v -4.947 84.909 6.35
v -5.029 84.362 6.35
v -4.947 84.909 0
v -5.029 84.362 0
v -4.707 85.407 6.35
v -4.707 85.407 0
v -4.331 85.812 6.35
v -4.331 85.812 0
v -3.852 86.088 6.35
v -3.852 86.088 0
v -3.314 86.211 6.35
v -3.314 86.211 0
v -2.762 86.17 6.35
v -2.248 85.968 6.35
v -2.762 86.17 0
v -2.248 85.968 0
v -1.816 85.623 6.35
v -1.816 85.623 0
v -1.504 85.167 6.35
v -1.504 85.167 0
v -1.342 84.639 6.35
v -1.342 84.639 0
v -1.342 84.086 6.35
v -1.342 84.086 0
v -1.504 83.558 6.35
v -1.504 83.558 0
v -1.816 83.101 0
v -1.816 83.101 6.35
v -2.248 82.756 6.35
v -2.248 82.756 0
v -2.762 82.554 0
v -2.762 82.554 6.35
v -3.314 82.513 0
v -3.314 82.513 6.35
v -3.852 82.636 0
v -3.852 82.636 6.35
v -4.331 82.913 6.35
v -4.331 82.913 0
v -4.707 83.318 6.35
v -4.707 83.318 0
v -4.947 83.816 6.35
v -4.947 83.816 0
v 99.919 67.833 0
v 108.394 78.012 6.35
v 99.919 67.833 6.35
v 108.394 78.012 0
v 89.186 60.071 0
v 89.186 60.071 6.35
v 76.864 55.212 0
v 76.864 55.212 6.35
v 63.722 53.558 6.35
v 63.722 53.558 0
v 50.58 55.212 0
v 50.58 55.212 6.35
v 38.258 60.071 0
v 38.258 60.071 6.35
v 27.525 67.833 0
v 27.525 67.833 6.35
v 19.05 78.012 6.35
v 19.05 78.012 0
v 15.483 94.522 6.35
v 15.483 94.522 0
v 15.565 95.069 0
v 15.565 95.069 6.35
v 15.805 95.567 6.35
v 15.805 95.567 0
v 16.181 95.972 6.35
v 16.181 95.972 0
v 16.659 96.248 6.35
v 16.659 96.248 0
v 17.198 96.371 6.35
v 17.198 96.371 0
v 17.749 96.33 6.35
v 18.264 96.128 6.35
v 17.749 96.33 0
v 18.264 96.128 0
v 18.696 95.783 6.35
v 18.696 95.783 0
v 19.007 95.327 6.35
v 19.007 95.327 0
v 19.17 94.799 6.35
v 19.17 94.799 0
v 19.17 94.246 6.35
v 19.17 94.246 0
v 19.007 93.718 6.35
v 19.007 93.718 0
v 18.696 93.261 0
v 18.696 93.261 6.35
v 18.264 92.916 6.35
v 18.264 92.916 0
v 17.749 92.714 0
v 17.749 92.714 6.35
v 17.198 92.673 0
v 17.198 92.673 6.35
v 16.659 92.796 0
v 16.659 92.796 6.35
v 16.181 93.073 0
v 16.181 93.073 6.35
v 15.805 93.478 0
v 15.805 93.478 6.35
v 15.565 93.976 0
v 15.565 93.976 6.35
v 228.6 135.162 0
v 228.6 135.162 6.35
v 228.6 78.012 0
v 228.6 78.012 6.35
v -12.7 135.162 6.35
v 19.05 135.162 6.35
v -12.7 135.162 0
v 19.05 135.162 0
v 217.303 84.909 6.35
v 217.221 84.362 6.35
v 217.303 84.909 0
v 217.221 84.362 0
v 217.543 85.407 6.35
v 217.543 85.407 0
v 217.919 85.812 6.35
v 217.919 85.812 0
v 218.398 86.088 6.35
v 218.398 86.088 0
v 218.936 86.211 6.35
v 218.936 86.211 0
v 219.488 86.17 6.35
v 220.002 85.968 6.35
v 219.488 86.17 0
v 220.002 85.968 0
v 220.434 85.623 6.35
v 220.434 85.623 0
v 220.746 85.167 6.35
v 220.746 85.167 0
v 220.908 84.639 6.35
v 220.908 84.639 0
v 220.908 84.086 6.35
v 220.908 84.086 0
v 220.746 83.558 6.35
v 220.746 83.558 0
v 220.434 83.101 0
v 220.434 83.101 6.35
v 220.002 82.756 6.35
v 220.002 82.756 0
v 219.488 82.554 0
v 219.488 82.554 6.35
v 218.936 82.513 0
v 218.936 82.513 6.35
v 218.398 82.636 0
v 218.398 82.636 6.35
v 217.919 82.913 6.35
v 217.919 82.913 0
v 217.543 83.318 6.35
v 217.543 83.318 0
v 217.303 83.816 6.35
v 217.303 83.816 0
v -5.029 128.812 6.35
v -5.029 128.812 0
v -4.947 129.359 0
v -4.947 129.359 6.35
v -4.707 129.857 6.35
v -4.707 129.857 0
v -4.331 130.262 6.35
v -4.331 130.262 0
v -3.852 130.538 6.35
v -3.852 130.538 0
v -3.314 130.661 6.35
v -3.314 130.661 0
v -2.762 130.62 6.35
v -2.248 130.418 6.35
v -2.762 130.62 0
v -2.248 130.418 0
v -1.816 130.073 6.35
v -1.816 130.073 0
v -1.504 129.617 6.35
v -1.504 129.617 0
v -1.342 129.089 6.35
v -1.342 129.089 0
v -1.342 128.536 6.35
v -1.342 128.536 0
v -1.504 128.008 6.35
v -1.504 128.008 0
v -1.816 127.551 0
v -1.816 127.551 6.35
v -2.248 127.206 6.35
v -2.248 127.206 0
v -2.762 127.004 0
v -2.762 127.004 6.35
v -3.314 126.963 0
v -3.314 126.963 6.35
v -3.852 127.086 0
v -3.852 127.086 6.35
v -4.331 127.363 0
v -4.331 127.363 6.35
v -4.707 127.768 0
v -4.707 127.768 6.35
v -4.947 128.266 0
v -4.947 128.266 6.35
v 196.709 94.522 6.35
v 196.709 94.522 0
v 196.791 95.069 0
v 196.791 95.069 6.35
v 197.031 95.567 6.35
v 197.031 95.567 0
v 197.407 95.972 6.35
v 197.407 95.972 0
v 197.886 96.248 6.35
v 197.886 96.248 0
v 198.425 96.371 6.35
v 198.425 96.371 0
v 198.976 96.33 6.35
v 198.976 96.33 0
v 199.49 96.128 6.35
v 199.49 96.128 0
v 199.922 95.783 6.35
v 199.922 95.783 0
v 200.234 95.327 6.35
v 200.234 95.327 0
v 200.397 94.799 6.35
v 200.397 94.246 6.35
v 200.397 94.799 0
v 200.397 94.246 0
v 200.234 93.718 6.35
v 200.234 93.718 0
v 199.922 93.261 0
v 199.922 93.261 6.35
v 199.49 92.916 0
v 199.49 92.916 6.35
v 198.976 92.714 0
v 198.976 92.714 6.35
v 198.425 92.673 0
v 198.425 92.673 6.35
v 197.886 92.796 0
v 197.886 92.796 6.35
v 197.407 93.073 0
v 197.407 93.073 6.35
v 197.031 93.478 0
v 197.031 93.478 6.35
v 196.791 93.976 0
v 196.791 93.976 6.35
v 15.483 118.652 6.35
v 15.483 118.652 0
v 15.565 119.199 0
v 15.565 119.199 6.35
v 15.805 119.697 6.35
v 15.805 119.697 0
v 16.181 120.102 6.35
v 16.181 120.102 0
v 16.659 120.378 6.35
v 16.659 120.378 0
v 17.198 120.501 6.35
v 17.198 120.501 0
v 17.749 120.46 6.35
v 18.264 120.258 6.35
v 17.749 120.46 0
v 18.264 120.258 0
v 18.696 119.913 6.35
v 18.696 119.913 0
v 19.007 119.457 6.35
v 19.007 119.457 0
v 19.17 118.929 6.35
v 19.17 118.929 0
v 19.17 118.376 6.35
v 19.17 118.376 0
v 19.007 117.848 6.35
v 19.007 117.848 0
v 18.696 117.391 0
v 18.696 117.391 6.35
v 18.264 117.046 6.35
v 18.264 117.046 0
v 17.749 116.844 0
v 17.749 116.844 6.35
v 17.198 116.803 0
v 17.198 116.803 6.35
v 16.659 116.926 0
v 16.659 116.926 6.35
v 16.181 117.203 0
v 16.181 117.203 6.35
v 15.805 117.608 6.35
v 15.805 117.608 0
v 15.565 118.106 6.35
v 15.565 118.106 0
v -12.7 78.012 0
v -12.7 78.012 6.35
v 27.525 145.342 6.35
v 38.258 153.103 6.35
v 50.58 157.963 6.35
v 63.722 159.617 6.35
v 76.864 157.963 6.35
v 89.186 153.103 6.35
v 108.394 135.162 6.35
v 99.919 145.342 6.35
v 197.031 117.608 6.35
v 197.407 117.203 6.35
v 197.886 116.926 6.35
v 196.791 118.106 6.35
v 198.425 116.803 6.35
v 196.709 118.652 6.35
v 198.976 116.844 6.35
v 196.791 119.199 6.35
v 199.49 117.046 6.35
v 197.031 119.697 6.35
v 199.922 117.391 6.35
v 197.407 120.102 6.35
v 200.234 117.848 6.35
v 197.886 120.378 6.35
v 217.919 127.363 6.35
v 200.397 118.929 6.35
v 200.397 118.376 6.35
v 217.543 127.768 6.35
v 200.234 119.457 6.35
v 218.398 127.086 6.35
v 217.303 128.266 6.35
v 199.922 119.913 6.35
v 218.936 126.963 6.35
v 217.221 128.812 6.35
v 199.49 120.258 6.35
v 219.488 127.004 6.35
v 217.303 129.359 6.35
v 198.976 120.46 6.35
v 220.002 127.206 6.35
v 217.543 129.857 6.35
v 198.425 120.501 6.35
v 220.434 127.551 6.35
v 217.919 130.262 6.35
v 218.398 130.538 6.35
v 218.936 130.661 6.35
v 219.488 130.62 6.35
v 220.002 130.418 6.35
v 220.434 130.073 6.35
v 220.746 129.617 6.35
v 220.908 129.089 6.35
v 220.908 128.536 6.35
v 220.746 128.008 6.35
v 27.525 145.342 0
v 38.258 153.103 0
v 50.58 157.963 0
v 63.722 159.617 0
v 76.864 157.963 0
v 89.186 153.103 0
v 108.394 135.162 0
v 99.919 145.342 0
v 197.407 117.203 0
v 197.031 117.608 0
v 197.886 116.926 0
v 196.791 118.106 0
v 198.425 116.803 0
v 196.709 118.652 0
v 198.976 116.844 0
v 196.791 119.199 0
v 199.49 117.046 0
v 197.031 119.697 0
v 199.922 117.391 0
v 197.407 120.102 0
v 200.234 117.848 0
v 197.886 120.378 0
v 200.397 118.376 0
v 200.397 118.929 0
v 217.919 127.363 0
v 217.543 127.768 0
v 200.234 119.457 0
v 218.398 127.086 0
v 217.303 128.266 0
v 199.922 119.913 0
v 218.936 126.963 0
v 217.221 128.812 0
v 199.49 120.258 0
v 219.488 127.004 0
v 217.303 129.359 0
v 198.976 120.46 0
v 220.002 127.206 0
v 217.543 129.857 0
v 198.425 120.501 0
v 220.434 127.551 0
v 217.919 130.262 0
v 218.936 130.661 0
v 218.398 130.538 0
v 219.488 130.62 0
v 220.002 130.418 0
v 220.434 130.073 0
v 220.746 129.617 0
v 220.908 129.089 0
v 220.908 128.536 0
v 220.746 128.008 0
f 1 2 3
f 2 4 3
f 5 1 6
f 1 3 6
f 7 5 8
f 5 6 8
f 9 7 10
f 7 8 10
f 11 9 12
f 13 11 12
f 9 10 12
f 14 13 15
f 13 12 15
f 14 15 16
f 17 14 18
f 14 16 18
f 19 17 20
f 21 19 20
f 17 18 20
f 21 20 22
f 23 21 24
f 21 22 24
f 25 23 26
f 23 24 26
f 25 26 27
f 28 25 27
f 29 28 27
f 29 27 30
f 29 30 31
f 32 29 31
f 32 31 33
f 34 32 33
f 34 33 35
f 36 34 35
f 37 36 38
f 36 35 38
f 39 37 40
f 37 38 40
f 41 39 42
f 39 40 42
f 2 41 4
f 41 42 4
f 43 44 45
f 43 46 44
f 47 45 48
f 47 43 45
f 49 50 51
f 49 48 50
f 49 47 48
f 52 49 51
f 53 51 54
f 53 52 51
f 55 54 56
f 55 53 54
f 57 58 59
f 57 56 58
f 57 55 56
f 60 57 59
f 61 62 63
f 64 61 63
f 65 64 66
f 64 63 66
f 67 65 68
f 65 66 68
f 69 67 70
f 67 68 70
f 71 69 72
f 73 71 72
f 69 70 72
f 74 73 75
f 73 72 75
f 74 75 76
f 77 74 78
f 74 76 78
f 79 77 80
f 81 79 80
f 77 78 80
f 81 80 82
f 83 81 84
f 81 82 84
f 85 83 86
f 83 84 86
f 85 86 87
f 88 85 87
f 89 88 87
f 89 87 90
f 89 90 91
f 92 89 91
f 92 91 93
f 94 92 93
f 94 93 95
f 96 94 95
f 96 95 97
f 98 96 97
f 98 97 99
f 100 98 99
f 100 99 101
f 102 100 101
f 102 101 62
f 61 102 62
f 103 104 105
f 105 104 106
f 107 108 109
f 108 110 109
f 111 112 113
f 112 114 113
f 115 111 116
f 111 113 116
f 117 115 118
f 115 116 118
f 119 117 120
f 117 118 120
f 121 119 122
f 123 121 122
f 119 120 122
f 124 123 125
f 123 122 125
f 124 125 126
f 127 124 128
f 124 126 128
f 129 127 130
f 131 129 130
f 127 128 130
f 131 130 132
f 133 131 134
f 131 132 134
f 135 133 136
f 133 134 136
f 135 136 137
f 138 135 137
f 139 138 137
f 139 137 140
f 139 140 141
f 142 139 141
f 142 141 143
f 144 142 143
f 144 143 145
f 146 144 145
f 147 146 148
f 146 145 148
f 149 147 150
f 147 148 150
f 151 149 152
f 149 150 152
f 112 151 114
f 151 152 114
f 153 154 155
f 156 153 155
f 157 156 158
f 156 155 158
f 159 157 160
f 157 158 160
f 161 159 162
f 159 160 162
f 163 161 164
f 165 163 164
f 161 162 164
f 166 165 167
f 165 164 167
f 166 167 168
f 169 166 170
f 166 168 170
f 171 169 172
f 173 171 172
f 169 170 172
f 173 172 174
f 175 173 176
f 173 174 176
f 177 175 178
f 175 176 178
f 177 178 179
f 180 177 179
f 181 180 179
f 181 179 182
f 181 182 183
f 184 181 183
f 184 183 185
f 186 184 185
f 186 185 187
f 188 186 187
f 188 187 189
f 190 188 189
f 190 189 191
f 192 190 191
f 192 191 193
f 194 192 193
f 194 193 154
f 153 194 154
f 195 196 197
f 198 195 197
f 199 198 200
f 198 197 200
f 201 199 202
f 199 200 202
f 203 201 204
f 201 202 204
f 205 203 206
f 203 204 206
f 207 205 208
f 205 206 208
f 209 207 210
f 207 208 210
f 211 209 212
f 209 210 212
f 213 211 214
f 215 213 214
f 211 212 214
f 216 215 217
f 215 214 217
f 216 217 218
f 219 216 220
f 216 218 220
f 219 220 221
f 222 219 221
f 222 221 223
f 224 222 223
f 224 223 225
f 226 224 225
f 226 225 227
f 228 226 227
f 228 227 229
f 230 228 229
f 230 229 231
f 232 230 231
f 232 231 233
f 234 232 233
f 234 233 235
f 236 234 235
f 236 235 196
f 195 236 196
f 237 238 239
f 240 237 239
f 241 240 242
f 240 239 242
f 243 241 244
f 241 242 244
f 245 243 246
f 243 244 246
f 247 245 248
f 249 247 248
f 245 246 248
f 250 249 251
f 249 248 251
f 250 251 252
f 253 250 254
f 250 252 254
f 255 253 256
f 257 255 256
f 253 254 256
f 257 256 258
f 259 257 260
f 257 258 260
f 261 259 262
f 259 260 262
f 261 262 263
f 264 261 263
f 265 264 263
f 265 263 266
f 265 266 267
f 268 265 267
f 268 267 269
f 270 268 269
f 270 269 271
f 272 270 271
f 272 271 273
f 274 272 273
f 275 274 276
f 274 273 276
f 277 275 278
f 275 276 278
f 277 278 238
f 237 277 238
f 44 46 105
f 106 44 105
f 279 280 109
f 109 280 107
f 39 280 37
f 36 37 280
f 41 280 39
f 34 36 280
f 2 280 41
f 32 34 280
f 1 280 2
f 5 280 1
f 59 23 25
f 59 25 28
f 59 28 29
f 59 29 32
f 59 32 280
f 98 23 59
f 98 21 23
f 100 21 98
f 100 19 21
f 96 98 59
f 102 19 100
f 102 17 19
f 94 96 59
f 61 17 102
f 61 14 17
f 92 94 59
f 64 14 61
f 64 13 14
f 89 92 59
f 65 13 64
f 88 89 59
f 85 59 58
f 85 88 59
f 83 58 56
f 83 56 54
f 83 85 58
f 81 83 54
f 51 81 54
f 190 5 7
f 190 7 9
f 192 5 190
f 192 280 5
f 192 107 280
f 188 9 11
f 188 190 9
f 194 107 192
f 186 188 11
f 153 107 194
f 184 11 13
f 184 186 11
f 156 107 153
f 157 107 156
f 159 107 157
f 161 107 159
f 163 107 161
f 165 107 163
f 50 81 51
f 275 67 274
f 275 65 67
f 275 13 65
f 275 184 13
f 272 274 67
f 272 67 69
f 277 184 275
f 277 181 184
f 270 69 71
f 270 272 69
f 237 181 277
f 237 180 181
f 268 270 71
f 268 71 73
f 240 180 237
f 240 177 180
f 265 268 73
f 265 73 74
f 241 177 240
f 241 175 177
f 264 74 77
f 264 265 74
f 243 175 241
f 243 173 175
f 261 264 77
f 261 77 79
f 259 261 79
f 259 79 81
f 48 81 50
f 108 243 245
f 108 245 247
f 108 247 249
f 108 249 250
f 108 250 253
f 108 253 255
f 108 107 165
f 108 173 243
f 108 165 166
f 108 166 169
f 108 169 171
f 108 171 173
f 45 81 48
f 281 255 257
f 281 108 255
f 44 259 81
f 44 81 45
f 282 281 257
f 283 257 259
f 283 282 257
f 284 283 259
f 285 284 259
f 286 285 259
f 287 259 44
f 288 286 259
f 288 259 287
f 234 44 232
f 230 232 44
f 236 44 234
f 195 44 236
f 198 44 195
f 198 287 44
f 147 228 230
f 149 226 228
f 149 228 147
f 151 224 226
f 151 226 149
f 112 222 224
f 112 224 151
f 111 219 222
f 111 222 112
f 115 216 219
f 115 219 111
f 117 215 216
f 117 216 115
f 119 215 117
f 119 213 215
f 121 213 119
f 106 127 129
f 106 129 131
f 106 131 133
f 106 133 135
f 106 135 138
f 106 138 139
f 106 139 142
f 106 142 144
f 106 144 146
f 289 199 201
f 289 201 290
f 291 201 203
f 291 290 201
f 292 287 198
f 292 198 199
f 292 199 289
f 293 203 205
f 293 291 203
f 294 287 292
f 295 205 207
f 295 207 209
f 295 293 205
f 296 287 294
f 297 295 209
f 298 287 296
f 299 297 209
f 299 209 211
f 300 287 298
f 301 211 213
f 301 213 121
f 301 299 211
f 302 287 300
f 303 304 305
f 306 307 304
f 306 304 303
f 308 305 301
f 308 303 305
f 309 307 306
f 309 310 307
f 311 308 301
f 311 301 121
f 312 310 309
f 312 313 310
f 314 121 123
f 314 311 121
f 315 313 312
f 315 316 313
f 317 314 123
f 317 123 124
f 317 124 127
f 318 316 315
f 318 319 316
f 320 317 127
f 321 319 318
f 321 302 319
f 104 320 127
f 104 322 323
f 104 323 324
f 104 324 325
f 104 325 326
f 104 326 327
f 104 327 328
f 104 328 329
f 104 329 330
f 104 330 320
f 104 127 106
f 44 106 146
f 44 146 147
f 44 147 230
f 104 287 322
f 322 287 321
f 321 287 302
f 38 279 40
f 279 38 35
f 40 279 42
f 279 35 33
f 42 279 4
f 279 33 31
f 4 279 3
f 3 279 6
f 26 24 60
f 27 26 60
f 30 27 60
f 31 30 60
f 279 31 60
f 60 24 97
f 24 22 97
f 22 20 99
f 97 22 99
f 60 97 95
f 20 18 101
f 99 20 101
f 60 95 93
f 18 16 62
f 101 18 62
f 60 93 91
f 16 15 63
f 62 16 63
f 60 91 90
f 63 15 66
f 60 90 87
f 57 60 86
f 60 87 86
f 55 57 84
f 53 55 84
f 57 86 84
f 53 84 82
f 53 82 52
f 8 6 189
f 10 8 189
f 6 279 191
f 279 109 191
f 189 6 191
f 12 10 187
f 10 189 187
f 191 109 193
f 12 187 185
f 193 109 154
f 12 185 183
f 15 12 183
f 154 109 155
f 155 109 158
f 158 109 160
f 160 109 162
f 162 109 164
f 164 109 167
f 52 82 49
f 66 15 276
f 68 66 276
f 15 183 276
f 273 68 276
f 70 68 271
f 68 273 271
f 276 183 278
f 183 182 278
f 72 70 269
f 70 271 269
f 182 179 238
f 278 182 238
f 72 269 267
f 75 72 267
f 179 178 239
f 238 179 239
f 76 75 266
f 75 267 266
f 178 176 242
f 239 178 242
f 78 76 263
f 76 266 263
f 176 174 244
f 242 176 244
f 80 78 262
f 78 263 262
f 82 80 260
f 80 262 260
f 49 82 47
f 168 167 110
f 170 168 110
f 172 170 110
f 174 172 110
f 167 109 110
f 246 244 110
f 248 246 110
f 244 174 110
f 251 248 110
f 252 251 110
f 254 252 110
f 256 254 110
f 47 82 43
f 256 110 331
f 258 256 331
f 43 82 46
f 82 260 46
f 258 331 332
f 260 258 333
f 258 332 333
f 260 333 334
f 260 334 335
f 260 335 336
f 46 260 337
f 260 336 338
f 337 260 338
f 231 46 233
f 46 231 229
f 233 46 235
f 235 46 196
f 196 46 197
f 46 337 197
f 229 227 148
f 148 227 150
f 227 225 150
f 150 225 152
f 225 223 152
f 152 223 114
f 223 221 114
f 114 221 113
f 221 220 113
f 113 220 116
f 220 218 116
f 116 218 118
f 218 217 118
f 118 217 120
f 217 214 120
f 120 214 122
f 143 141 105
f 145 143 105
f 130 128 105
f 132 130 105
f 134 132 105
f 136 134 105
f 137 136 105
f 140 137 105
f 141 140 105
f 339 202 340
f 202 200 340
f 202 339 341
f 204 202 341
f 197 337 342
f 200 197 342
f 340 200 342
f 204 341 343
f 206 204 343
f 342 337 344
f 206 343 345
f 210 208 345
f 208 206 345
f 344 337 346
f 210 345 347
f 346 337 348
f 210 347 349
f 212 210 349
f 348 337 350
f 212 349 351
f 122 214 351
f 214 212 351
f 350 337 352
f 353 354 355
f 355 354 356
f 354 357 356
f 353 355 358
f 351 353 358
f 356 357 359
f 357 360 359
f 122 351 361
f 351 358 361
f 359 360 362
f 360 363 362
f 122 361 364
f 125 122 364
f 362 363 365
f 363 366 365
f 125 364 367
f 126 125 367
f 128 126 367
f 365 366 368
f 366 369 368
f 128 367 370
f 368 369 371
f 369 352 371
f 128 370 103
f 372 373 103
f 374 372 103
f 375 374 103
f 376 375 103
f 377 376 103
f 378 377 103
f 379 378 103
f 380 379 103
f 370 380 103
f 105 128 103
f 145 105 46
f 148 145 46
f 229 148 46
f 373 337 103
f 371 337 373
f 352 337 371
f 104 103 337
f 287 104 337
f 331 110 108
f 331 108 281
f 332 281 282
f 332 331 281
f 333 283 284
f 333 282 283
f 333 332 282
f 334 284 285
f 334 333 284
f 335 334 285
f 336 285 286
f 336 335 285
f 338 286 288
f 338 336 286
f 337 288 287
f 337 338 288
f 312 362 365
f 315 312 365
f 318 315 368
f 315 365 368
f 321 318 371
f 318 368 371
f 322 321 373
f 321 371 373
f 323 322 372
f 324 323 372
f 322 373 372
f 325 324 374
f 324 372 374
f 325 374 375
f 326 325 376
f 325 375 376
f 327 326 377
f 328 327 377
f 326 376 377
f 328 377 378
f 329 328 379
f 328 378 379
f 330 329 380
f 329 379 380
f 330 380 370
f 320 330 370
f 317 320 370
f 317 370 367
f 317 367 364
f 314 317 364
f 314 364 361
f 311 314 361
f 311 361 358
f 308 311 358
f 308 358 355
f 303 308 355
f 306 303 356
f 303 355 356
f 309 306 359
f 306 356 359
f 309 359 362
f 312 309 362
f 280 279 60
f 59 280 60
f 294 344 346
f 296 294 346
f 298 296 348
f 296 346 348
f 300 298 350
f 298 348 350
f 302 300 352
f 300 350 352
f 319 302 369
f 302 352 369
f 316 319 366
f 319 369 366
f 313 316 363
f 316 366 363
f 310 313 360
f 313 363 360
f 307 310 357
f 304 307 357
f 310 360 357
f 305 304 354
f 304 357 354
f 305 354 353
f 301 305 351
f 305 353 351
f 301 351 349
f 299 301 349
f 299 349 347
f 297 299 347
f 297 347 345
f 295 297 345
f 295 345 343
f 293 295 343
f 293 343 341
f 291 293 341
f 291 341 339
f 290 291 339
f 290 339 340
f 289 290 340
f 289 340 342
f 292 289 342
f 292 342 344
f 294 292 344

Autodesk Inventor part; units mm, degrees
ref_plane "YZ Plane" through (0, 0, 0) normal (1, 0, 0) x (0, 1, 0)
ref_plane "XZ Plane" through (0, 0, 0) normal (0, 1, 0) x (-1, 0, 0)
ref_plane "XY Plane" through (0, 0, 0) normal (0, 0, 1) x (1, 0, 0)
sketch "Sketch1" plane through (0, 0, 0) normal (0, 0, 1) x (1, 0, 0)
  line L0 (0, 78.0122) -> (0, 82.508) projected
  line L1 (-6.35, 82.508) -> (-6.35, 78.0122) projected
  line L2 (-6.35, 78.0122) -> (0, 78.0122) projected
  line L3 (222.25, 130.6664) -> (222.25, 135.1622) projected
  line L4 (215.9, 135.1622) -> (222.25, 135.1622) projected
  line L5 (215.9, 135.1622) -> (215.9, 130.6664) projected
  line L6 (222.25, 78.0122) -> (222.25, 135.1622)
  line L7 (-6.35, 135.1622) -> (-6.35, 78.0122)
  arc A0 (65.1726, 108.6235) -> (63.7223, 104.0872) centre (63.7223, 106.5872) ccw projected
  line L8 (222.25, 135.1622) -> (108.3945, 135.1622)
  line L9 (19.05, 135.1622) -> (-6.35, 135.1622)
  line L10 (-6.35, 78.0122) -> (19.05, 78.0122)
  line L11 (108.3945, 78.0122) -> (222.25, 78.0122)
  arc A1 (108.3945, 135.1622) -> (19.05, 135.1622) centre (63.7223, 106.5872) ccw
  arc A2 (19.05, 78.0122) -> (108.3945, 78.0122) centre (63.7223, 106.5872) ccw
  line L12 (215.9, 130.6664) -> (222.25, 130.6664) projected
  line L13 (0, 82.508) -> (-6.35, 82.508) projected
  point P0 (0, 0)
  dimension "d19" = 57.15
  dimension "d20" = 57.15
  dimension "d21" = 228.6
  dimension "d22" = 228.6
  dimension "d23" = 25.4
  dimension "d24" = 25.4
  dimension "d25" = 113.8555
  dimension "d26" = 113.8555
extrude "Extrusion1" add sketch "Sketch1" along normal blind 6.35
extrude "Extrusion2" [suppressed]
sketch "Sketch3" plane through (0, 0, 0) normal (0, 0, -1) x (-1, 0, 0)
  line L0 (6.35, 135.1622) -> (6.35, 78.0122) construction
  line L1 (-222.25, 135.1622) -> (-108.3945, 135.1622) construction
  line L2 (-222.25, 78.0122) -> (-222.25, 135.1622) construction
  line L3 (-108.3945, 78.0122) -> (-222.25, 78.0122) construction
  line L4 (-215.9, 135.1622) -> (-215.9, 130.6664) construction
  line L5 (-217.6131, 96.5879) -> (-200.4173, 96.5879) construction
  line L6 (-200.4173, 90.2379) -> (-217.6131, 90.2379) construction
  line L7 (-217.6131, 90.2379) -> (-217.6131, 96.5879) construction
  line L8 (-217.6131, 121.9879) -> (-200.4173, 121.9879) construction
  line L9 (-200.4173, 115.6379) -> (-217.6131, 115.6379) construction
  line L10 (-217.6131, 115.6379) -> (-217.6131, 121.9879) construction
  circle A0 centre (-219.075, 128.8122) radius 1.8542
  circle A1 centre (-198.5631, 118.6522) radius 1.8542
  line L11 (-222.25, 106.5872) -> (-215.9, 106.5872) construction
  circle A2 centre (-219.075, 84.3622) radius 1.8542
  circle A3 centre (-198.5631, 94.5222) radius 1.8542
  line L12 (-107.95, 135.1622) -> (-107.95, 78.0122) construction
  circle A4 centre (3.175, 128.8122) radius 1.8542
  circle A5 centre (-17.3369, 118.6522) radius 1.8542
  circle A6 centre (-17.3369, 94.5222) radius 1.8542
  circle A7 centre (3.175, 84.3622) radius 1.8542
  line L13 (-200.4173, 121.9879) -> (-200.4173, 115.6379) projected
  line L14 (-200.4173, 96.5879) -> (-200.4173, 90.2379) projected
  line L15 (6.35, 78.0122) -> (-19.05, 78.0122) projected
  line L16 (-19.05, 135.1622) -> (6.35, 135.1622) projected
  point P0 (0, 0)
  point P1 (-215.9, 135.1622)
  dimension "d7" = 3.7084
  dimension "d8" = 3.175
  dimension "d9" = 3.175
  dimension "d10" = 6.35
  dimension "d11" = 3.7084
  dimension "d12" = 19.05
  dimension "d13" = 28.575
  dimension "d14" = 28.575
  dimension "d15" = 114.3
  dimension "d16" = 114.3
  dimension "d27" = 16.51
  dimension "d28" = 16.51
  dimension "d29" = 23.6868
  dimension "d30" = 23.6868
  dimension "d31" = 16.51
  dimension "d32" = 16.51
  dimension "d33" = 23.6868
  dimension "d34" = 23.6868
extrude "Extrusion3" cut sketch "Sketch3" against normal through all
sketch "Sketch4" plane through (0, 0, 6.35) normal (0, 0, 1) x (1, 0, 0)
  line L0 (222.25, 135.1622) -> (228.6, 135.1622)
  line L1 (228.6, 135.1622) -> (228.6, 78.0122)
  line L2 (228.6, 78.0122) -> (222.25, 78.0122)
  line L3 (222.25, 78.0122) -> (222.25, 135.1622)
  line L4 (-6.35, 78.0122) -> (-12.7, 78.0122)
  line L5 (-12.7, 78.0122) -> (-12.7, 135.1622)
  line L6 (-12.7, 135.1622) -> (-6.35, 135.1622)
  line L7 (-6.35, 135.1622) -> (-6.35, 78.0122)
  point P0 (0, 0)
  dimension "d35" = 6.35
  dimension "d36" = 57.15
  dimension "d37" = 6.35
  dimension "d38" = 57.15
extrude "Extrusion4" add sketch "Sketch4" against normal blind 6.35
sketch "Sketch5" plane through (0, 0, 6.35) normal (0, 0, 1) x (1, 0, 0)
  line L0 (228.6, 135.1622) -> (228.6, 78.0122) projected
  line L1 (-12.7, 78.0122) -> (-12.7, 135.1622) projected
  line L2 (255.1581, 125.1613) -> (255.1581, 88.0132) projected
  line L3 (261.5081, 88.0132) -> (255.1581, 88.0132) projected
  line L4 (261.5081, 88.0132) -> (261.5081, 125.1613) projected
  line L5 (261.5081, 125.1613) -> (255.1581, 125.1613) projected
  line L6 (-6.35, 125.1613) -> (-6.35, 88.0132) projected
  line L7 (0, 88.0132) -> (-6.35, 88.0132) projected
  line L8 (0, 88.0132) -> (0, 125.1613) projected
  line L9 (0, 125.1613) -> (-6.35, 125.1613) projected
  line L10 (255.1581, 119.2872) -> (261.5081, 119.2872)
  line L11 (261.5081, 119.2872) -> (261.5081, 93.8872)
  line L12 (261.5081, 93.8872) -> (255.1581, 93.8872)
  line L13 (255.1581, 93.8872) -> (255.1581, 119.2872)
  line L14 (-12.7, 106.5872) -> (228.6, 106.5872) construction
  line L15 (107.95, 135.1622) -> (107.95, 78.0122) construction
  line L16 (-6.35, 125.1613) -> (0, 125.1613)
  line L17 (-39.2581, 119.2872) -> (-45.6081, 119.2872)
  line L18 (-45.6081, 119.2872) -> (-45.6081, 93.8872)
  line L19 (-45.6081, 93.8872) -> (-39.2581, 93.8872)
  line L20 (-39.2581, 93.8872) -> (-39.2581, 119.2872)
  point P0 (0, 0)
  dimension "d41" = 25.4
  dimension "d43" = 5.874
  dimension "d44" = 5.874
  dimension "d45" = 120.65
  dimension "d46" = 120.65
extrude "Extrusion5" cut sketch "Sketch5" against normal through all contours L10 L4 L12 L2 | L20 L19 L18 L17
sketch "Sketch6" plane through (0, 0, 6.35) normal (0, 0, 1) x (1, 0, 0)
  circle A0 centre (95.3576, 24.463) radius 3.175 construction
  circle A1 centre (97.1959, 37.4808) radius 1.8542 projected
  circle A2 centre (108.3755, 22.6247) radius 1.8542 projected
  circle A3 centre (93.5193, 11.4451) radius 1.8542 projected
  circle A4 centre (82.3397, 26.3012) radius 1.8542 projected
  circle A5 centre (95.3576, 24.463) radius 19.05 construction
  point P0 (0, 0)
extrude "Extrusion6" cut sketch "Sketch6" against normal through all
equation "\"d8\" = d9"
equation "\"d13\" = d14"
equation "\"d15\" = d16"
equation "\"d43\" = d44"
equation "\"d45\" = d46"
properties part number "tiltStructureCrossBeamRB01" material "Wood (Cherry)"
